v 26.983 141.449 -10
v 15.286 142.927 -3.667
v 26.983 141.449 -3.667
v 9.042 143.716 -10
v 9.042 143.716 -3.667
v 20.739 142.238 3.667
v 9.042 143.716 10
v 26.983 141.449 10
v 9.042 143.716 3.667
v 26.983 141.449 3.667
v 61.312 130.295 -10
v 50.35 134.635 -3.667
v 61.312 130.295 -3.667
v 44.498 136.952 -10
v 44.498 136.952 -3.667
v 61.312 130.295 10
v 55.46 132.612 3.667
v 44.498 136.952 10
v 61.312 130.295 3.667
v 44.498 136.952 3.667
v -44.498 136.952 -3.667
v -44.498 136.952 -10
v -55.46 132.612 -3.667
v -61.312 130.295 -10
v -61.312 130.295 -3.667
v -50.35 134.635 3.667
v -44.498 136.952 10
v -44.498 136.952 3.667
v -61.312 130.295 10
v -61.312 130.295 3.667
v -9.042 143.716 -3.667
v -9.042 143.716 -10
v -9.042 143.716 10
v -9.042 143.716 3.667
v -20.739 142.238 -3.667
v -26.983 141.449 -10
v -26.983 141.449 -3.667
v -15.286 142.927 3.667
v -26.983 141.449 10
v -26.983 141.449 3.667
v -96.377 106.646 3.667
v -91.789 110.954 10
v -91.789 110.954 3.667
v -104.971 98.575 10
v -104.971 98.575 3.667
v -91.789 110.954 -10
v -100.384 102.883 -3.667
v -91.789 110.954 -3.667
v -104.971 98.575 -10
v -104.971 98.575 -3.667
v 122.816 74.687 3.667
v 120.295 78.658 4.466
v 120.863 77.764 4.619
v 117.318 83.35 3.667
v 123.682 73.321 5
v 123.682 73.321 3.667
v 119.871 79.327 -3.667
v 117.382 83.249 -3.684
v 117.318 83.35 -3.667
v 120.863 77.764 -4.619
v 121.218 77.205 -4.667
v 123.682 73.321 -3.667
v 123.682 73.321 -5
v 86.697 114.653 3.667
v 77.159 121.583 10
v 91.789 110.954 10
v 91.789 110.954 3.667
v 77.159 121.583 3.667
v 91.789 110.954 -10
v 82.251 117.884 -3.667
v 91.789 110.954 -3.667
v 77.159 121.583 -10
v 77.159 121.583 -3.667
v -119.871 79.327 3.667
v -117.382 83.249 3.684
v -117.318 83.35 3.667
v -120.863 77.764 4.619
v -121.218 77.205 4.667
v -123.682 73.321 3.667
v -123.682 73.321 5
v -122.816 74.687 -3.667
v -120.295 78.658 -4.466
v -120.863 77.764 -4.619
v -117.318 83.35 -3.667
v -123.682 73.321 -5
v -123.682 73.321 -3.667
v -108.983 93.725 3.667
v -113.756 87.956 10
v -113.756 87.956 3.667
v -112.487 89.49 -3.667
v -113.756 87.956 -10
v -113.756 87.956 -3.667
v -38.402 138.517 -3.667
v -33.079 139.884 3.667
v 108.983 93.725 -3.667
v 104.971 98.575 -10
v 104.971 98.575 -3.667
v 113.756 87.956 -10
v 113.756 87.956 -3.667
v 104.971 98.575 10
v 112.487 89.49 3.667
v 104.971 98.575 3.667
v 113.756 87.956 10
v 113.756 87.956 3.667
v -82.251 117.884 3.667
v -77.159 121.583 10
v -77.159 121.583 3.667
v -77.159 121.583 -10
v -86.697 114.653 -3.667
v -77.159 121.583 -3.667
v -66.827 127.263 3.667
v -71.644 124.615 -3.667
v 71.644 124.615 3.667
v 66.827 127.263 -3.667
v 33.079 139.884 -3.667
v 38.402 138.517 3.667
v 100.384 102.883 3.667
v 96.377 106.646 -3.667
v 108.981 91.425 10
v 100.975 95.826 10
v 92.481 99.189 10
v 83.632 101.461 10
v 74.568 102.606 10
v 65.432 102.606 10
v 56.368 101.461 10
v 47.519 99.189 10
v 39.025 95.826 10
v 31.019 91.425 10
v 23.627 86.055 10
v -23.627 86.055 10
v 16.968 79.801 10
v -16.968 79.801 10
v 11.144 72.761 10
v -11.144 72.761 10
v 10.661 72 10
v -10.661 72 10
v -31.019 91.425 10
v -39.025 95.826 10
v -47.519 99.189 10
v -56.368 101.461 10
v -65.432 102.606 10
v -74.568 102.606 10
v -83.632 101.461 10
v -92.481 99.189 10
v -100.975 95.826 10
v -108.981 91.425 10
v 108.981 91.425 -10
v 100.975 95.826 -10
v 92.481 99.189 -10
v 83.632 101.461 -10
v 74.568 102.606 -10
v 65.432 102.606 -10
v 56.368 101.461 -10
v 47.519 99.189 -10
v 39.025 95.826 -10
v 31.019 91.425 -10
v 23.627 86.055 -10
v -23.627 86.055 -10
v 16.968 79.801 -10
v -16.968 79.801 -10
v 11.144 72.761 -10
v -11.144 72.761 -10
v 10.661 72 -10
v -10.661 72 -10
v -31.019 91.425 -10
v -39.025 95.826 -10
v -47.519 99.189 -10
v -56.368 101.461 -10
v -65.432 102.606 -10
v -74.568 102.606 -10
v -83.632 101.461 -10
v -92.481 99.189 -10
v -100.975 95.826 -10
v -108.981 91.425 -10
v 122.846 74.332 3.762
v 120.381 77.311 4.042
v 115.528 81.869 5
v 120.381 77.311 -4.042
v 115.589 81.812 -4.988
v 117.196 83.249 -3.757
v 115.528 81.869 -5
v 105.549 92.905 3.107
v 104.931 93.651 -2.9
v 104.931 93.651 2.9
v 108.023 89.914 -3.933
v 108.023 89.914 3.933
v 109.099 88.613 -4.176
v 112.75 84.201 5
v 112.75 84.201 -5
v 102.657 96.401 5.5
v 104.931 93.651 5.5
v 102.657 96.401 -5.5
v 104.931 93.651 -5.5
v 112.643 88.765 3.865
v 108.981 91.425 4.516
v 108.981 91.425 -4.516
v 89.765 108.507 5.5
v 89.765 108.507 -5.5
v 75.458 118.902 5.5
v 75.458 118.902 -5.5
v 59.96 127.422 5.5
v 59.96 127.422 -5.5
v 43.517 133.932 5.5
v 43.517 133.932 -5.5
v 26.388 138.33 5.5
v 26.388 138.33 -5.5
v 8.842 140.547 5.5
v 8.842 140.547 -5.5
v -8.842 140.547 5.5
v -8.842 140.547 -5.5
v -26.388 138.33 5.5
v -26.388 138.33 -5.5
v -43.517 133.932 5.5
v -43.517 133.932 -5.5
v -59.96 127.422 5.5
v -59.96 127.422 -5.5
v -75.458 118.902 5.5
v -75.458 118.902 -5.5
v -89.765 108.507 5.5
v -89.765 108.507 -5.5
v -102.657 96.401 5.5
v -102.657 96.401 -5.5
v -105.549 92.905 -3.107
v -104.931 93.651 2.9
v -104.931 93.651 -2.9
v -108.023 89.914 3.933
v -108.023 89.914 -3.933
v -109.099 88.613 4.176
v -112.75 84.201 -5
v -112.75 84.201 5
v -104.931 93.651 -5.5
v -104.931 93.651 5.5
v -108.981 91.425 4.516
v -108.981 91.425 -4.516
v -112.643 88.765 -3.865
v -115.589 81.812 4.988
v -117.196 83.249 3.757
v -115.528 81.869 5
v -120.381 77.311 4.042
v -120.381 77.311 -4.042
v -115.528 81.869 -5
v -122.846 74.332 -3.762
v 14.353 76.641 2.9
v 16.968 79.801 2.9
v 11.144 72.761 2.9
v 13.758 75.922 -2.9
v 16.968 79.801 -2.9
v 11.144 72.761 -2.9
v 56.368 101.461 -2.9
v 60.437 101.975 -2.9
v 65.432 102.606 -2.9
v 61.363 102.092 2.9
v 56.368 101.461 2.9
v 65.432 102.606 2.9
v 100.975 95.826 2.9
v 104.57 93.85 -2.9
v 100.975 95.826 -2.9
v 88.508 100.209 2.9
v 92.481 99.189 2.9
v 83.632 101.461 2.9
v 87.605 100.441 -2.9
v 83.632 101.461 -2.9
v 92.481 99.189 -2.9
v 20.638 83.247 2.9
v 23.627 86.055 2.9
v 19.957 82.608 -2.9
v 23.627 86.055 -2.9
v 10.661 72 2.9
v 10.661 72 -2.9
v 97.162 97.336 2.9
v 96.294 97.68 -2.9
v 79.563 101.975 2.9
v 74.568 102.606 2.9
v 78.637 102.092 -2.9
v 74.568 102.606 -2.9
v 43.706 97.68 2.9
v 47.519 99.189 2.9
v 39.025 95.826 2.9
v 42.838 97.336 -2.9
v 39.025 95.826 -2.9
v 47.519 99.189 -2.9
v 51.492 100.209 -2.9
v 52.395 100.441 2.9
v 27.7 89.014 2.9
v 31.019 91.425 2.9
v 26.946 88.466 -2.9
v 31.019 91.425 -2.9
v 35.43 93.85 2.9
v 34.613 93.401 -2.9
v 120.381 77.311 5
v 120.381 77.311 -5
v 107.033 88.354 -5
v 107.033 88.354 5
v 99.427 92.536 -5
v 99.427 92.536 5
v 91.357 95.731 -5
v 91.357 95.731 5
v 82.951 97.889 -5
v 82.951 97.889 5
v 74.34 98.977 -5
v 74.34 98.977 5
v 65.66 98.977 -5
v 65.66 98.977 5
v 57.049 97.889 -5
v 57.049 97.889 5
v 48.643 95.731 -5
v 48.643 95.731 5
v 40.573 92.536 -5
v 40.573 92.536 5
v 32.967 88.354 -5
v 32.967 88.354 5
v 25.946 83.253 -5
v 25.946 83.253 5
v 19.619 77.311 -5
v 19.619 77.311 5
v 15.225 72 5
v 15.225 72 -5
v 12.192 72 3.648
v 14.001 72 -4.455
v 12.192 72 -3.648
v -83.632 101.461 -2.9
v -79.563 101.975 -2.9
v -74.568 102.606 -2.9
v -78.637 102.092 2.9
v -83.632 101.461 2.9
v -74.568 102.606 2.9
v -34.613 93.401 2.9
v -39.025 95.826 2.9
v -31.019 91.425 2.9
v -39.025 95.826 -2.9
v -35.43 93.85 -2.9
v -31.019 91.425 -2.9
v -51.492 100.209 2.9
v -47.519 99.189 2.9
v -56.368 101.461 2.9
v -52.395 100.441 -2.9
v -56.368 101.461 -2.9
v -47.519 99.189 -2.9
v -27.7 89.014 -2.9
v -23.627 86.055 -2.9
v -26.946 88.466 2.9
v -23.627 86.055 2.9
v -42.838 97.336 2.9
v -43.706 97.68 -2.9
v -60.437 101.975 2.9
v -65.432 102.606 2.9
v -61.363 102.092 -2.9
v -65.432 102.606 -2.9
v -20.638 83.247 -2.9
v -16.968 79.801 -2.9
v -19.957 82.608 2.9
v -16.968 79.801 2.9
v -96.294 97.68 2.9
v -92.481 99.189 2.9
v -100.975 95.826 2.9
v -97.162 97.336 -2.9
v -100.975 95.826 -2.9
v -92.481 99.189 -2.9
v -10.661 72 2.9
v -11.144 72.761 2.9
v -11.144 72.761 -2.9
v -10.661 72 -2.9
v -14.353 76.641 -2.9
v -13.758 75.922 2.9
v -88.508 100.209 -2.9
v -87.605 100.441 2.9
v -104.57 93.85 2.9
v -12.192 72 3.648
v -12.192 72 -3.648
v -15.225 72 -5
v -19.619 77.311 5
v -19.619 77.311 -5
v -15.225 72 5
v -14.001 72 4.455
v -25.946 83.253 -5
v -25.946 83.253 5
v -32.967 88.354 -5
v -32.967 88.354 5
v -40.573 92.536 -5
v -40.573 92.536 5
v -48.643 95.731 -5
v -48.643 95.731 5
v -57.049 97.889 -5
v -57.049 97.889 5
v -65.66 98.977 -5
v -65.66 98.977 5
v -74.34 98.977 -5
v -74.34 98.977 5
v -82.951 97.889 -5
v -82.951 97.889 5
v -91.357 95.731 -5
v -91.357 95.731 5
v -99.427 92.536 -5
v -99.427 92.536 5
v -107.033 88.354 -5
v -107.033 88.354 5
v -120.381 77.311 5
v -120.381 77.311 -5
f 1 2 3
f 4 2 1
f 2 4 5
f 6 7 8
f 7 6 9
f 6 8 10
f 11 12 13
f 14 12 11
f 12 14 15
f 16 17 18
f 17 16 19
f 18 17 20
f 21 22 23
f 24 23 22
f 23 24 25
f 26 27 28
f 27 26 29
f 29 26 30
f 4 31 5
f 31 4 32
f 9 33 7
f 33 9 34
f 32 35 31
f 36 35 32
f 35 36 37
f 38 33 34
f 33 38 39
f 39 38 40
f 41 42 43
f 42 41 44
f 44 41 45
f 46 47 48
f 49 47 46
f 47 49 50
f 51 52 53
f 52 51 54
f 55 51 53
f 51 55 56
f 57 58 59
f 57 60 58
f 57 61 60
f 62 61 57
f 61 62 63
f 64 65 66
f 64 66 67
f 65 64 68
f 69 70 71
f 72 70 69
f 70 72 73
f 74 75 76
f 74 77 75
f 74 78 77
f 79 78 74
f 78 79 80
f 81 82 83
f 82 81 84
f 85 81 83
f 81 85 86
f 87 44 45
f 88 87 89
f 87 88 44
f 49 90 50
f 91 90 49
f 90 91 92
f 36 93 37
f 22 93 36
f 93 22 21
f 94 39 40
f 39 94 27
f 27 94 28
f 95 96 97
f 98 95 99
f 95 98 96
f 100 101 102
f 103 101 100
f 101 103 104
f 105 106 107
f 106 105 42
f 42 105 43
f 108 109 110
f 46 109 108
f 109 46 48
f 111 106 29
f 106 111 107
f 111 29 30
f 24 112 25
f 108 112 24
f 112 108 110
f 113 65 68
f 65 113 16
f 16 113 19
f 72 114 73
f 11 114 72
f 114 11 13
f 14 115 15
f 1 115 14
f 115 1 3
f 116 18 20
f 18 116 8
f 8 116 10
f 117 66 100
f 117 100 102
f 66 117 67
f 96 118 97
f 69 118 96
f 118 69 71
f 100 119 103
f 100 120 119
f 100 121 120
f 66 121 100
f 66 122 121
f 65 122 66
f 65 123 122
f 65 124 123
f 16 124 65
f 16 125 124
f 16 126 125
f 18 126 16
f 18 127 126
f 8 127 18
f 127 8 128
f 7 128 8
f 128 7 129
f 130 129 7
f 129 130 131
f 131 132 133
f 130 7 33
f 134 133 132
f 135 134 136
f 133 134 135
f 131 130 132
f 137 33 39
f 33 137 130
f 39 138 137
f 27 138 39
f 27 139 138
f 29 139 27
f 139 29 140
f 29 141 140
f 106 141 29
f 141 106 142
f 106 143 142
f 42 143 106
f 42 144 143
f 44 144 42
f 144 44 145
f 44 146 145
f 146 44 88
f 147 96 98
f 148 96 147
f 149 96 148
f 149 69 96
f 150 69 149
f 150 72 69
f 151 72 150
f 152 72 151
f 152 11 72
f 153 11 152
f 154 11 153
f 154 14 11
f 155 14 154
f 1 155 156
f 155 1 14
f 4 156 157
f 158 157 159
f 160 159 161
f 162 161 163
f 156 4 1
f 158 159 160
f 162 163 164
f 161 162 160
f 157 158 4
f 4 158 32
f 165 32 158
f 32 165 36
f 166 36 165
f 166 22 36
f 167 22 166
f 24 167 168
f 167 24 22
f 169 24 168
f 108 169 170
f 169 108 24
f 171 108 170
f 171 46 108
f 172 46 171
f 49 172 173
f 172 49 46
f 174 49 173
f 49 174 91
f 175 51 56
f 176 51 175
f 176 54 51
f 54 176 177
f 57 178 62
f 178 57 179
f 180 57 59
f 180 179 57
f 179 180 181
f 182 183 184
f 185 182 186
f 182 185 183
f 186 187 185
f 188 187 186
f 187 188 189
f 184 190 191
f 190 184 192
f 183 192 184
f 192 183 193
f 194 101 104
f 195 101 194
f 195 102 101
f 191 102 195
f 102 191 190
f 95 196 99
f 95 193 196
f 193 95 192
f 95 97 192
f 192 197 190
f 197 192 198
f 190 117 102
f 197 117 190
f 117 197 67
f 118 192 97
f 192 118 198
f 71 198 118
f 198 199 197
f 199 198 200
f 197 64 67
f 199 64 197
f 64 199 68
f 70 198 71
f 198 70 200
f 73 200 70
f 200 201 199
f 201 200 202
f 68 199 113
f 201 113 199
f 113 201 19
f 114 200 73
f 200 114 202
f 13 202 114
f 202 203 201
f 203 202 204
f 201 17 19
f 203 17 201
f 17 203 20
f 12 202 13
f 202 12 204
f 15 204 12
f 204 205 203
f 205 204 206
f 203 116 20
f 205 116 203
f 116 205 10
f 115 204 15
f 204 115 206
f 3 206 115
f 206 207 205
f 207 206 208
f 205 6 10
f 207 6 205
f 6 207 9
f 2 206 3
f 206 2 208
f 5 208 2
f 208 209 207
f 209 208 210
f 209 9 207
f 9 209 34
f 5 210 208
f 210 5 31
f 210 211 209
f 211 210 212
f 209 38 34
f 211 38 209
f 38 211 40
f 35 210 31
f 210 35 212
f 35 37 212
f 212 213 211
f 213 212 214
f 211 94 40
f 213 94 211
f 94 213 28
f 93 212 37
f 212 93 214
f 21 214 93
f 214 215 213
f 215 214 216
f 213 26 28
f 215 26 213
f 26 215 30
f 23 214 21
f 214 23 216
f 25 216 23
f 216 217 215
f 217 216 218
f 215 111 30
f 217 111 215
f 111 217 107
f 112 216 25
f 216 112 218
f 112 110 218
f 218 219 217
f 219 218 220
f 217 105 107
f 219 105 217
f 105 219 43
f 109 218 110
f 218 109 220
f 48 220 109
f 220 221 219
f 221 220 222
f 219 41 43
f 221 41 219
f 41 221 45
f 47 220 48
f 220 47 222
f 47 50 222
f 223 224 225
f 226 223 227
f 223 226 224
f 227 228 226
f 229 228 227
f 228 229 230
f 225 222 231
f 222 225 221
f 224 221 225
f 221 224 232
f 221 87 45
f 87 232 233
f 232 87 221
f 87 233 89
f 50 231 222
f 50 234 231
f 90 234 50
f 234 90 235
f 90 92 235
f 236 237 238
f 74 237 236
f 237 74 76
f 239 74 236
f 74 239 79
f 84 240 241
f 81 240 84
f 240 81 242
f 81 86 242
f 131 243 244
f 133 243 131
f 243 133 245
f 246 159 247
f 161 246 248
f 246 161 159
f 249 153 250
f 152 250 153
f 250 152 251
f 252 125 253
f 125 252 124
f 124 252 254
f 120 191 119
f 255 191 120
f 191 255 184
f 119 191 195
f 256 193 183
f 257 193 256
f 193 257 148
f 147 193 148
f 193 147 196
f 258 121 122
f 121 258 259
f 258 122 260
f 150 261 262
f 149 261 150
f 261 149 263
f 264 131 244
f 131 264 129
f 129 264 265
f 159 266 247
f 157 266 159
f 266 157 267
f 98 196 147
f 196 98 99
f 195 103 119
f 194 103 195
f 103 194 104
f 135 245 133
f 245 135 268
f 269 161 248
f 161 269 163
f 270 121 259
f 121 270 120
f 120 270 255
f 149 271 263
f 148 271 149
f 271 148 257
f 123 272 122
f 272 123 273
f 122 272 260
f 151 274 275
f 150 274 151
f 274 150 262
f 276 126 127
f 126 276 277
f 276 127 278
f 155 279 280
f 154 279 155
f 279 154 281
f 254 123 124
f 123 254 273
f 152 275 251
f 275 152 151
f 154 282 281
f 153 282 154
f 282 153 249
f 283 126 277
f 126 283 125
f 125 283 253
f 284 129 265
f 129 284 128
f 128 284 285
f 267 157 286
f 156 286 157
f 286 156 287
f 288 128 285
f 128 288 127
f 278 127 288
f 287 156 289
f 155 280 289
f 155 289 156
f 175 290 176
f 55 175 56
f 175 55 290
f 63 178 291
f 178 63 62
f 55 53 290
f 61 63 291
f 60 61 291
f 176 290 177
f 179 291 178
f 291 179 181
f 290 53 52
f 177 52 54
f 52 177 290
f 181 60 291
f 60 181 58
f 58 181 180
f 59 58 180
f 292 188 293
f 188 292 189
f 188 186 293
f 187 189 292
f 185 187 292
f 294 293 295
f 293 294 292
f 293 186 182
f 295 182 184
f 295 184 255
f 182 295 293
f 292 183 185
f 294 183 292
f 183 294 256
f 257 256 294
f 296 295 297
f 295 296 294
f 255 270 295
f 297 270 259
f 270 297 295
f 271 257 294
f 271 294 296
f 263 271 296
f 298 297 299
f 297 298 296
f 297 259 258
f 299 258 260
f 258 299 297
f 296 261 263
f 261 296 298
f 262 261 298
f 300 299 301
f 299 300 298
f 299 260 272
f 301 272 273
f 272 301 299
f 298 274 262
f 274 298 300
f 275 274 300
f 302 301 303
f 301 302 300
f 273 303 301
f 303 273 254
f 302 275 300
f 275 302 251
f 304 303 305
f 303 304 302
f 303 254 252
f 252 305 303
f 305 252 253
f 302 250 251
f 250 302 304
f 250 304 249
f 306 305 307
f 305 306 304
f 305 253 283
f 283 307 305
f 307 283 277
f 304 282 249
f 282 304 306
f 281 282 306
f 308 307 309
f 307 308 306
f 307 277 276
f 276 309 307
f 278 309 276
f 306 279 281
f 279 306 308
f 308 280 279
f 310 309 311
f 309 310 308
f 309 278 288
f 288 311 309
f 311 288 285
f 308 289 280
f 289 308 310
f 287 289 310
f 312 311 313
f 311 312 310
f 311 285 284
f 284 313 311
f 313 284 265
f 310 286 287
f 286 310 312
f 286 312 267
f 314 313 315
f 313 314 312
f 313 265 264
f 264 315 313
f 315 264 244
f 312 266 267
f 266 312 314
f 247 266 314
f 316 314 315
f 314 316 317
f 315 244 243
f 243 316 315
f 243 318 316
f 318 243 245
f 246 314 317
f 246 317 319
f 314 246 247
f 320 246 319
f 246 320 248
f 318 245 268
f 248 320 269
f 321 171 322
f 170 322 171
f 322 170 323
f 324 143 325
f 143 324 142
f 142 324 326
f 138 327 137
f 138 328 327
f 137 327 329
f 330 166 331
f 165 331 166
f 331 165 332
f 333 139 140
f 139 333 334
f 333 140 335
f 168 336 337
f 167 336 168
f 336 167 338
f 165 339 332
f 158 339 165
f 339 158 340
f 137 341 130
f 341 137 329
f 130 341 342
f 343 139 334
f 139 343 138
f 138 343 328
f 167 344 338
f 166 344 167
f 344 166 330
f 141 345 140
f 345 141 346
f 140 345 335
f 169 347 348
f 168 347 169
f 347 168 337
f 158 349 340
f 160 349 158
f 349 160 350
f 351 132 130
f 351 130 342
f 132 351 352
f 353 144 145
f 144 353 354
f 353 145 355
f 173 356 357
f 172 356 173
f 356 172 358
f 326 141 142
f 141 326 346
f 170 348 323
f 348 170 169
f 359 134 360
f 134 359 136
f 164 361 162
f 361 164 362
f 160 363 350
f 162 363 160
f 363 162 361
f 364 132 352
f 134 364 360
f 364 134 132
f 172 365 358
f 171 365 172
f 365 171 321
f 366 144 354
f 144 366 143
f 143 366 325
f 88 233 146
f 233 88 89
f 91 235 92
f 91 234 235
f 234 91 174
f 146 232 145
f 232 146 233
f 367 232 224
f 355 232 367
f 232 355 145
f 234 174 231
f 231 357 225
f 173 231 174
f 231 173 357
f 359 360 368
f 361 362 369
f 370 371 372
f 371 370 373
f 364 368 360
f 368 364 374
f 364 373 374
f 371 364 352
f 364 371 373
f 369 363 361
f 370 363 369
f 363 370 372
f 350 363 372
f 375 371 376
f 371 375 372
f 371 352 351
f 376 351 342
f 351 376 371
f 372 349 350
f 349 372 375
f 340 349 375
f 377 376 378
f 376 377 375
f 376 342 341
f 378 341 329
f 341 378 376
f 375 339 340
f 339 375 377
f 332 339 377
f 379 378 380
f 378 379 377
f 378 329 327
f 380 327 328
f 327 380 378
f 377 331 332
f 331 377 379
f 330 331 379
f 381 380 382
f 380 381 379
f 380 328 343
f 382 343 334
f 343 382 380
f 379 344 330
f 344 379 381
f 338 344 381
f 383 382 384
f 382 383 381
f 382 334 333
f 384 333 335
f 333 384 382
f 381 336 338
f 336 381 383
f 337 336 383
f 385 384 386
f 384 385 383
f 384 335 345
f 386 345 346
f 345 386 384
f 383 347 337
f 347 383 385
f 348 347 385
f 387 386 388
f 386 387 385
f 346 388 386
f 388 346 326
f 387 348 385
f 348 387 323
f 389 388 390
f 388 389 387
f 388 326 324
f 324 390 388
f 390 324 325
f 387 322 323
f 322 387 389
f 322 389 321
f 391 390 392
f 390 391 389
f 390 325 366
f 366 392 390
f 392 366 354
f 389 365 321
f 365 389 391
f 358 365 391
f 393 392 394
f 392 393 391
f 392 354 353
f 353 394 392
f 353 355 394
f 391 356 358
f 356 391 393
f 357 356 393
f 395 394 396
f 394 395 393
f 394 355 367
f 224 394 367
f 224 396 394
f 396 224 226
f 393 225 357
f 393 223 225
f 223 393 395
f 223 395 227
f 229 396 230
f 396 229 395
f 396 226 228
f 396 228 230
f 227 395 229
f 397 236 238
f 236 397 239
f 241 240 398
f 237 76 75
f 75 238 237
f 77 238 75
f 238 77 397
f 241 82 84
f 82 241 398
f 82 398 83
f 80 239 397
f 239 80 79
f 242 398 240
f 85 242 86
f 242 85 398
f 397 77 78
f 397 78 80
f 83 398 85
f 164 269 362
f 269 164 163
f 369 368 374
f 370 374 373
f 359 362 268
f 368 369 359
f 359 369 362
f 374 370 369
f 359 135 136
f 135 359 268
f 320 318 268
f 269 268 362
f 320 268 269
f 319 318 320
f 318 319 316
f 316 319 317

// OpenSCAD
$fn = 50;

echo("@@@@@@@@@@@@@@@@@@@@@@@@@@@@@@@@@@@@@@@@@@@@@@@@@@@@@@@@@@@@@@@@@@@@@@@@@@@@@@@");
echo("@@@@@@@@@@@@@@@@@@@@@@@@@Start rendering @@@@@@@@@@@@@@@@@@@@@@@@@@@@@@@@@@@@@@@@");


PRINT_WHOLE = true;

PRINT_TOP_ARCH = false;

SEGMENT_HT = 20;
TAIL_WD = 10;
TAIL_HT = 3;
TOOTH_BITE = 2;
// TAIL_CLEARANCE = 2;


// have decided 18,36,72
// NOMINAL_SEGMENT_RAD = 18;
NOMINAL_SEGMENT_RAD = 36;
// NOMINAL_SEGMENT_RAD = 72;

NEG_COEFF = 0.46;


cylinder_rad = NOMINAL_SEGMENT_RAD;// - TAIL_HT;
segment_rad = cylinder_rad;
neg_segment_rad = NOMINAL_SEGMENT_RAD*NEG_COEFF; //- TAIL_HT;
tail_triangle_rad = (TAIL_WD * sqrt(3))/3;
// tail_triangle_rad = 8;

module body_and_slot(this_cylinder_rad, center_coords, negative=false){
    if(this_cylinder_rad > TAIL_WD){
        NEGATIVE_RAD_OS = 0.75;
        scaled_cylinder_rad = negative ? this_cylinder_rad + NEGATIVE_RAD_OS : this_cylinder_rad;
        scaled_ht = negative ? SEGMENT_HT + 2*NEGATIVE_RAD_OS : SEGMENT_HT;
        translate([center_coords[0], center_coords[1], 0]){
            difference(){
                // the main cylinder body
                rotate_extrude(angle=180, convexity=10){
                    translate([scaled_cylinder_rad/2, 0, 0]){
                        square(size=[scaled_cylinder_rad, scaled_ht], center=true);
                    }
                }
                // the tail triangle
                rotate_extrude(angle=180, convexity=10){
                    // note just the unscaled cylinder rad is used here 
                    // because the triangle is scaled up or down we don't need to scale the translation
                    translate([this_cylinder_rad, 0, 0]){
                        rotate([0, 0, 0]){
                            // if this a negative then we need to scale the triangle
                            // so that the hole is slightly larger than the solid tail
                            triangle_scale = negative ? 1.0 : 1.1;
                            scale([triangle_scale, triangle_scale, 1]){
                                circle(r=tail_triangle_rad, $fn=3);
                            }
                        }
                    }
                }
            }
        }
    }else{
        echo("ZZZ cylinder rad too small to rotate tail triangle ZZZ");
    }
}


// [major_radius,height_ratio,[negative_x, negative_y]]
layer_details = [
    [144, 0.5, [70,30]],
    [72, 0.5, [30,15]]];

//     [36, 0.75, [15,8]],
//     [18, 1.0, [0,0]],
// ];


// recursive function to display the whole structure
module whole_structure(level = 0, center_coords=[0,0]){
    echo("level: ", level, " center_coords: ", center_coords);
    // recursion escape clause
    if (level < len(layer_details)){
        this_layer = layer_details[level];
        this_cylinder_rad = this_layer[0];
        this_height_ratio = this_layer[1];
        this_negative_coords = this_layer[2];
        neg_seg_details = (level < len(layer_details) - 1)?layer_details[level + 1]:[0,0,[0,0]];


        difference(){
            // display the body and slot
            body_and_slot(this_cylinder_rad, center_coords, negative=false);
            cube([2.1 * this_cylinder_rad, 2 * (this_cylinder_rad * this_height_ratio), SEGMENT_HT *1.1], 
                    center=true);
            pos_center_coords = [this_negative_coords[0] + center_coords[0],
                                 this_negative_coords[1] + center_coords[1]];
            opposite_coords = [center_coords[0]-this_negative_coords[0], 
                             center_coords[1]+this_negative_coords[1]];

            neg_rad = neg_seg_details[0];

            // now the next level
            if (level < len(layer_details) - 1){
                body_and_slot(neg_rad, this_negative_coords, negative=true);
                whole_structure(level + 1, this_negative_coords);
                
                body_and_slot(neg_rad, opposite_coords, negative=true);
                whole_structure(level + 1, opposite_coords);
                
            }else{
                difference(){
                    #body_and_slot(neg_rad, pos_center_coords, negative=false);
                    translate([pos_center_coords[0], pos_center_coords[1], 0]){
                        cube([2.1 * neg_rad, 2 * neg_rad, SEGMENT_HT *1.1], center=true);
                    }
                }
                
                difference(){
                    body_and_slot(neg_rad, opposite_coords, negative=false);
                    translate([opposite_coords[0], opposite_coords[1], 0]){
                        cube([2.1 * neg_rad, 2 * neg_rad, SEGMENT_HT *1.1], center=true);
                    }
                }
            }
        }
    }

}



whole_structure();




// if (PRINT_WHOLE){
//     intersection(){
//         full_segment();

//         // translate([-37, 0, 0]){
//         //     cylinder(r=segment_rad/2.5, h=SEGMENT_HT *1.5, center=false);
//         // }
//     }
// }else{

//     if (PRINT_TOP_ARCH){
//         difference(){
//             intersection(){
//                 full_segment();
//                 chopping_cube();
//             }
//             full_segment();
//             register_spikes();
//         }
        
//     }else{
//         difference(){
//             full_segment();
//             chopping_cube();
//         }

//         register_spikes();
        
//     }
// }
